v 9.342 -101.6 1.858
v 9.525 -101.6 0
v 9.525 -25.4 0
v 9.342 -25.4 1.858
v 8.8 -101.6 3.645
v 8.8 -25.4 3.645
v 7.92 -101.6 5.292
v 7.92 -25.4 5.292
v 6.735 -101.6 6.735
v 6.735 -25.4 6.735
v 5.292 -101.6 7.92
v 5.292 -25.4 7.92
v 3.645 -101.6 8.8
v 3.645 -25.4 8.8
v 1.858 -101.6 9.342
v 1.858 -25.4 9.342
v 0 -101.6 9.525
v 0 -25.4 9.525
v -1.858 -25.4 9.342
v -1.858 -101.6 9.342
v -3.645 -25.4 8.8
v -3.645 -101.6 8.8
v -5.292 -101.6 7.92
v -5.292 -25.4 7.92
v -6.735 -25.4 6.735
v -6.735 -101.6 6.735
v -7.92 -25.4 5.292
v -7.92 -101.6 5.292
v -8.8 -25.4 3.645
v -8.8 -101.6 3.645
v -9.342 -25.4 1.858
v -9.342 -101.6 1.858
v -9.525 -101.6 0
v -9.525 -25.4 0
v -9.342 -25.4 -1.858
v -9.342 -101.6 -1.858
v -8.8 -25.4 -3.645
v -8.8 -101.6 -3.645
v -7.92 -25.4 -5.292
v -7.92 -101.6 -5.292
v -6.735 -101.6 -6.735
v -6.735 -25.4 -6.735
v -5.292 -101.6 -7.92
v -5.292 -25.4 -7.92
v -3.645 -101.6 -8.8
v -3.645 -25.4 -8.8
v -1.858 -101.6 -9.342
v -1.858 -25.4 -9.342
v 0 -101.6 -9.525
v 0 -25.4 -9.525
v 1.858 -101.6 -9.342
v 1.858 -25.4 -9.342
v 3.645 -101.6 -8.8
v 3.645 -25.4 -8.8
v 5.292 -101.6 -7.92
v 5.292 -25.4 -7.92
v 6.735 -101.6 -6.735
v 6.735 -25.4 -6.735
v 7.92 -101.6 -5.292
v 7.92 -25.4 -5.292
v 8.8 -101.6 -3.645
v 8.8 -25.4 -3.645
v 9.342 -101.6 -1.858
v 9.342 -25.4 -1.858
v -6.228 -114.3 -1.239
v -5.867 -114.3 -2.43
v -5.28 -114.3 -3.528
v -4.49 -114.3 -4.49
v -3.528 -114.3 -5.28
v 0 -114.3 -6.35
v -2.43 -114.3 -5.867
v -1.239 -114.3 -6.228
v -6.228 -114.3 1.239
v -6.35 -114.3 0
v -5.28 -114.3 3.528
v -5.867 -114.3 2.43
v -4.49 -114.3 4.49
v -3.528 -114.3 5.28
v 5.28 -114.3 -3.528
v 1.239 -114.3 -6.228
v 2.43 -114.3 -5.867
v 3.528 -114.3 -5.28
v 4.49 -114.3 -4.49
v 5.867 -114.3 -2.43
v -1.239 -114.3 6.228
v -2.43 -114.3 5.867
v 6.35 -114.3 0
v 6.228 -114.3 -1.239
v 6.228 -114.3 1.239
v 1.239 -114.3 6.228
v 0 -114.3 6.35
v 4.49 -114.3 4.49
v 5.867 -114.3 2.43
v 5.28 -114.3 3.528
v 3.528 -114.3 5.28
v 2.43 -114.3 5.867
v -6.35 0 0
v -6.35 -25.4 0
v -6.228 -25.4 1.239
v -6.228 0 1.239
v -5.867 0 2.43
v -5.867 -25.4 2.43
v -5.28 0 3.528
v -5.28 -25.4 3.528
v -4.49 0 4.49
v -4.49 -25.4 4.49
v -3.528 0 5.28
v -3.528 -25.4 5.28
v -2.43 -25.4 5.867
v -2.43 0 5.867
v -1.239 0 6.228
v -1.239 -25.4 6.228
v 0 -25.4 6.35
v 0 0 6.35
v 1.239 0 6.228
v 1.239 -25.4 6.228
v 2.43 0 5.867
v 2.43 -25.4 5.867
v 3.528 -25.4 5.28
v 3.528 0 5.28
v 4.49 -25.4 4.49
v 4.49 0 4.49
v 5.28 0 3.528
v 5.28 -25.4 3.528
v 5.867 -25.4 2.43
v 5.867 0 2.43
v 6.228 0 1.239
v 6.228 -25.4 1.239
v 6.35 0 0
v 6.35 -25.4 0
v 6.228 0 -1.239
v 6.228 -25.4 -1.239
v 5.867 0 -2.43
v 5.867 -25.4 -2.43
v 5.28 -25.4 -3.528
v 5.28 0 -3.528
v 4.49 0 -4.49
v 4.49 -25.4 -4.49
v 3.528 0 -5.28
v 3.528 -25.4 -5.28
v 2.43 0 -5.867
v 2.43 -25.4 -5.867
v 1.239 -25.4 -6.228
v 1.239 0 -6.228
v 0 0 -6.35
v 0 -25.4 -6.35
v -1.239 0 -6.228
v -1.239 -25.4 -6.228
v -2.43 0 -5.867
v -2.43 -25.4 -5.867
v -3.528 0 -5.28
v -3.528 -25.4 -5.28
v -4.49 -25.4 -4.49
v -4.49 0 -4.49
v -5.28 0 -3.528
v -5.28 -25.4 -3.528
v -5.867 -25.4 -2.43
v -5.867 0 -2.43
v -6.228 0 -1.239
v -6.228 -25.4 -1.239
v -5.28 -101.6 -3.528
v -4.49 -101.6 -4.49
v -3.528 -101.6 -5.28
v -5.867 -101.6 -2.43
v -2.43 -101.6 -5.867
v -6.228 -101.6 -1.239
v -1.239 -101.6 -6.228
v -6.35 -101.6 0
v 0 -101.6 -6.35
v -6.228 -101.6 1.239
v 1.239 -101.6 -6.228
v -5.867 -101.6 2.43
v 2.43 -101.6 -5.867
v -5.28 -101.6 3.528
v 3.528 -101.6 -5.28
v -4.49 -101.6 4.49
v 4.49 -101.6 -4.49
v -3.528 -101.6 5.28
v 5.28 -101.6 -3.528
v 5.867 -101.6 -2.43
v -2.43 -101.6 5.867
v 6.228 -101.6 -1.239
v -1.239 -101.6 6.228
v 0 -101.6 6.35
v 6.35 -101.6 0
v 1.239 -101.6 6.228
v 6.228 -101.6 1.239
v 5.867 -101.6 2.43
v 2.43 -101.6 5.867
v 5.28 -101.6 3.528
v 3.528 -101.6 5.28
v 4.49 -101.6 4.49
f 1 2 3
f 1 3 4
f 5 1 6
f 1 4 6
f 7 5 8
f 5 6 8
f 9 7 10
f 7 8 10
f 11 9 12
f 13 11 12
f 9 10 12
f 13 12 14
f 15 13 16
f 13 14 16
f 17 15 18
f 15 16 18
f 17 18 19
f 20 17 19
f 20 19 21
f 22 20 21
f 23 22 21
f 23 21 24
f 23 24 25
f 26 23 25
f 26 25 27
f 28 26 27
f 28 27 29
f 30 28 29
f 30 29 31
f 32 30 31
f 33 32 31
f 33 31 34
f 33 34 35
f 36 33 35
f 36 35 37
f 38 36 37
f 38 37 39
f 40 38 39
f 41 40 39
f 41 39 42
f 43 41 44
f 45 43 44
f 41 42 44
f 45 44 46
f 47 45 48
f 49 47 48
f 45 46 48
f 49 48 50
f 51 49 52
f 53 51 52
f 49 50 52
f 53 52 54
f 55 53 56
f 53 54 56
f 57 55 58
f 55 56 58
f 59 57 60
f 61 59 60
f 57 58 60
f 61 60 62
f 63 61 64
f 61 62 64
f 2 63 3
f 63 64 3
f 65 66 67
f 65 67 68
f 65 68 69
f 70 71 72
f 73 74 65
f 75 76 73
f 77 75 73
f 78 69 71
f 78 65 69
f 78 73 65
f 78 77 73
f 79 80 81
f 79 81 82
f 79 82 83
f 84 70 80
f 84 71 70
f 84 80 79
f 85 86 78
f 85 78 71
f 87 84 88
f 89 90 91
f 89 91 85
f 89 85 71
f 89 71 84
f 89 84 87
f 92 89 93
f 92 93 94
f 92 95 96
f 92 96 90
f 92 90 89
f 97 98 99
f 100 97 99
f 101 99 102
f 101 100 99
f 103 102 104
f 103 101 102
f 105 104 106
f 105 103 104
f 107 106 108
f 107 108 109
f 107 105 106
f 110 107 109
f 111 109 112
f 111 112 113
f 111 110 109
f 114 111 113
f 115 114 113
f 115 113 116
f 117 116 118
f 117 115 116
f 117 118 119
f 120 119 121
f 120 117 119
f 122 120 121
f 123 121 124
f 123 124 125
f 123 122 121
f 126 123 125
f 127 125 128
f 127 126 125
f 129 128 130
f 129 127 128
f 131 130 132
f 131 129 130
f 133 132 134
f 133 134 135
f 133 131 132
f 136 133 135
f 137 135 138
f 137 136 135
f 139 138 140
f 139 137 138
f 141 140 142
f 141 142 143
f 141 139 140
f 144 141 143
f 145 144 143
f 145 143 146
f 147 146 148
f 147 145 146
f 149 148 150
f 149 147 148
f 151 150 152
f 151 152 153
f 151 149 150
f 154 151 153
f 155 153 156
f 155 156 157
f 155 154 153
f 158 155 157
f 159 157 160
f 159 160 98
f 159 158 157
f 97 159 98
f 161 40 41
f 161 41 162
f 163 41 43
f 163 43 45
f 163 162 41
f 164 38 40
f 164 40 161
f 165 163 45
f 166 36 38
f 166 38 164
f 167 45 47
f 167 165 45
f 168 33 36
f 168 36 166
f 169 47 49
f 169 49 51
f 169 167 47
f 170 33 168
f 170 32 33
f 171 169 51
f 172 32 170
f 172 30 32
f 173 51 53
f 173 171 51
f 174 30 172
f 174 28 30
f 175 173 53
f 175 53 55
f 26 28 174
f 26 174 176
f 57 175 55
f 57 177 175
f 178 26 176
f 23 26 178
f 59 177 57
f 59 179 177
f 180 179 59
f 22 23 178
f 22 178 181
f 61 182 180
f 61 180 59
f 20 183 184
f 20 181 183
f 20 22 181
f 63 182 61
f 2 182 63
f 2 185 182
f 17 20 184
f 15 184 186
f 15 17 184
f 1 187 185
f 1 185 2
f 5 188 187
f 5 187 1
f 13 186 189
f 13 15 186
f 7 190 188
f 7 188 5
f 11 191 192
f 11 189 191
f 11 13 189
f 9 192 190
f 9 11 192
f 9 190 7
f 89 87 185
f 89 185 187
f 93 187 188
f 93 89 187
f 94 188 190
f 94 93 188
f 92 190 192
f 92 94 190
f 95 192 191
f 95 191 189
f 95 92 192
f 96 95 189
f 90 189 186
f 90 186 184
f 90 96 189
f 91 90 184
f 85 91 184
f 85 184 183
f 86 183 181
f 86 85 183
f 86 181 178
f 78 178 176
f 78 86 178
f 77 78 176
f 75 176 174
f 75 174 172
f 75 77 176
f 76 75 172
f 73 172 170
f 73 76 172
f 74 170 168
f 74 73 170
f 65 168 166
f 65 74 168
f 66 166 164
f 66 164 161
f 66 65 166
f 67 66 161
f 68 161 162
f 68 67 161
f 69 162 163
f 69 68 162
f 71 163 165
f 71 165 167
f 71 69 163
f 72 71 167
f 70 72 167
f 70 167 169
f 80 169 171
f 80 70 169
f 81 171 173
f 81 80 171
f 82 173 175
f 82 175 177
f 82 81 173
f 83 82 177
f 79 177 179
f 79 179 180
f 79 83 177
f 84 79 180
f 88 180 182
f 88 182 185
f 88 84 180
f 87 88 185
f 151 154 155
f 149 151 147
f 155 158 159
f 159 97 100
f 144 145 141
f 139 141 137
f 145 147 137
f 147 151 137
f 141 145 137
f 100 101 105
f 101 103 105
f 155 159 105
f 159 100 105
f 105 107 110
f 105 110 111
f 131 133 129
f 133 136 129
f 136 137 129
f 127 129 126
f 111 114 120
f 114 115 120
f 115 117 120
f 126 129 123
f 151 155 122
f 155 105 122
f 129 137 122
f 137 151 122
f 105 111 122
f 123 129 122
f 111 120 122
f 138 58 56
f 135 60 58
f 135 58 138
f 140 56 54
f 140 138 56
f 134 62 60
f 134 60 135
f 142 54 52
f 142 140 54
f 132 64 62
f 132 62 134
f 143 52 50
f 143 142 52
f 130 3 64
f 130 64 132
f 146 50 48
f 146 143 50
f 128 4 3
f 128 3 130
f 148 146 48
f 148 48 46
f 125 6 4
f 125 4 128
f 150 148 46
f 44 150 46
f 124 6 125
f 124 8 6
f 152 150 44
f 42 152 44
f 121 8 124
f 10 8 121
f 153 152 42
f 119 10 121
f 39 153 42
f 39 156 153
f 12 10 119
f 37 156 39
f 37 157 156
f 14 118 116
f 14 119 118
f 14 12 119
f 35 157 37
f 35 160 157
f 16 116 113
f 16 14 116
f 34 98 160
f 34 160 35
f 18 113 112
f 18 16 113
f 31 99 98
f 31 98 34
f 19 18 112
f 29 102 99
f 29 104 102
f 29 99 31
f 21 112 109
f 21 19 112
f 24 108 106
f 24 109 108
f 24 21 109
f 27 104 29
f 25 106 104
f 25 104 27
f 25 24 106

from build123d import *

# Parameters (mm, degrees)
F0_R     = 9.525
F0_R_2   = 6.35
F1_DEPTH = 114.3
F2_R     = 9.525
F2_R_2   = 6.35
F3_DEPTH = 12.7
F4_R     = 9.525
F4_R_2   = 6.35
F5_DEPTH = 25.4


with BuildPart() as f1:
    # F0 (on Front) → F1 (new body)
    with BuildSketch(Plane.XZ):
        Circle(F0_R)
        Circle(F0_R_2, mode=Mode.SUBTRACT)
        Circle(F0_R_2)
    extrude(amount=F1_DEPTH)

    # F2 (on face) → F3 (cut)
    with BuildSketch(Plane.XZ.offset(114.3)):
        Circle(F2_R)
        Circle(F2_R_2, mode=Mode.SUBTRACT)
    extrude(amount=-F3_DEPTH, mode=Mode.SUBTRACT)

    # F4 (on face) → F5 (cut)
    with BuildSketch(Plane(origin=(0, 0, 0), x_dir=(-1, 0, 0), z_dir=(0, 1, 0))):
        Circle(F4_R)
        Circle(F4_R_2, mode=Mode.SUBTRACT)
    extrude(amount=-F5_DEPTH, mode=Mode.SUBTRACT)


solid = f1.part
